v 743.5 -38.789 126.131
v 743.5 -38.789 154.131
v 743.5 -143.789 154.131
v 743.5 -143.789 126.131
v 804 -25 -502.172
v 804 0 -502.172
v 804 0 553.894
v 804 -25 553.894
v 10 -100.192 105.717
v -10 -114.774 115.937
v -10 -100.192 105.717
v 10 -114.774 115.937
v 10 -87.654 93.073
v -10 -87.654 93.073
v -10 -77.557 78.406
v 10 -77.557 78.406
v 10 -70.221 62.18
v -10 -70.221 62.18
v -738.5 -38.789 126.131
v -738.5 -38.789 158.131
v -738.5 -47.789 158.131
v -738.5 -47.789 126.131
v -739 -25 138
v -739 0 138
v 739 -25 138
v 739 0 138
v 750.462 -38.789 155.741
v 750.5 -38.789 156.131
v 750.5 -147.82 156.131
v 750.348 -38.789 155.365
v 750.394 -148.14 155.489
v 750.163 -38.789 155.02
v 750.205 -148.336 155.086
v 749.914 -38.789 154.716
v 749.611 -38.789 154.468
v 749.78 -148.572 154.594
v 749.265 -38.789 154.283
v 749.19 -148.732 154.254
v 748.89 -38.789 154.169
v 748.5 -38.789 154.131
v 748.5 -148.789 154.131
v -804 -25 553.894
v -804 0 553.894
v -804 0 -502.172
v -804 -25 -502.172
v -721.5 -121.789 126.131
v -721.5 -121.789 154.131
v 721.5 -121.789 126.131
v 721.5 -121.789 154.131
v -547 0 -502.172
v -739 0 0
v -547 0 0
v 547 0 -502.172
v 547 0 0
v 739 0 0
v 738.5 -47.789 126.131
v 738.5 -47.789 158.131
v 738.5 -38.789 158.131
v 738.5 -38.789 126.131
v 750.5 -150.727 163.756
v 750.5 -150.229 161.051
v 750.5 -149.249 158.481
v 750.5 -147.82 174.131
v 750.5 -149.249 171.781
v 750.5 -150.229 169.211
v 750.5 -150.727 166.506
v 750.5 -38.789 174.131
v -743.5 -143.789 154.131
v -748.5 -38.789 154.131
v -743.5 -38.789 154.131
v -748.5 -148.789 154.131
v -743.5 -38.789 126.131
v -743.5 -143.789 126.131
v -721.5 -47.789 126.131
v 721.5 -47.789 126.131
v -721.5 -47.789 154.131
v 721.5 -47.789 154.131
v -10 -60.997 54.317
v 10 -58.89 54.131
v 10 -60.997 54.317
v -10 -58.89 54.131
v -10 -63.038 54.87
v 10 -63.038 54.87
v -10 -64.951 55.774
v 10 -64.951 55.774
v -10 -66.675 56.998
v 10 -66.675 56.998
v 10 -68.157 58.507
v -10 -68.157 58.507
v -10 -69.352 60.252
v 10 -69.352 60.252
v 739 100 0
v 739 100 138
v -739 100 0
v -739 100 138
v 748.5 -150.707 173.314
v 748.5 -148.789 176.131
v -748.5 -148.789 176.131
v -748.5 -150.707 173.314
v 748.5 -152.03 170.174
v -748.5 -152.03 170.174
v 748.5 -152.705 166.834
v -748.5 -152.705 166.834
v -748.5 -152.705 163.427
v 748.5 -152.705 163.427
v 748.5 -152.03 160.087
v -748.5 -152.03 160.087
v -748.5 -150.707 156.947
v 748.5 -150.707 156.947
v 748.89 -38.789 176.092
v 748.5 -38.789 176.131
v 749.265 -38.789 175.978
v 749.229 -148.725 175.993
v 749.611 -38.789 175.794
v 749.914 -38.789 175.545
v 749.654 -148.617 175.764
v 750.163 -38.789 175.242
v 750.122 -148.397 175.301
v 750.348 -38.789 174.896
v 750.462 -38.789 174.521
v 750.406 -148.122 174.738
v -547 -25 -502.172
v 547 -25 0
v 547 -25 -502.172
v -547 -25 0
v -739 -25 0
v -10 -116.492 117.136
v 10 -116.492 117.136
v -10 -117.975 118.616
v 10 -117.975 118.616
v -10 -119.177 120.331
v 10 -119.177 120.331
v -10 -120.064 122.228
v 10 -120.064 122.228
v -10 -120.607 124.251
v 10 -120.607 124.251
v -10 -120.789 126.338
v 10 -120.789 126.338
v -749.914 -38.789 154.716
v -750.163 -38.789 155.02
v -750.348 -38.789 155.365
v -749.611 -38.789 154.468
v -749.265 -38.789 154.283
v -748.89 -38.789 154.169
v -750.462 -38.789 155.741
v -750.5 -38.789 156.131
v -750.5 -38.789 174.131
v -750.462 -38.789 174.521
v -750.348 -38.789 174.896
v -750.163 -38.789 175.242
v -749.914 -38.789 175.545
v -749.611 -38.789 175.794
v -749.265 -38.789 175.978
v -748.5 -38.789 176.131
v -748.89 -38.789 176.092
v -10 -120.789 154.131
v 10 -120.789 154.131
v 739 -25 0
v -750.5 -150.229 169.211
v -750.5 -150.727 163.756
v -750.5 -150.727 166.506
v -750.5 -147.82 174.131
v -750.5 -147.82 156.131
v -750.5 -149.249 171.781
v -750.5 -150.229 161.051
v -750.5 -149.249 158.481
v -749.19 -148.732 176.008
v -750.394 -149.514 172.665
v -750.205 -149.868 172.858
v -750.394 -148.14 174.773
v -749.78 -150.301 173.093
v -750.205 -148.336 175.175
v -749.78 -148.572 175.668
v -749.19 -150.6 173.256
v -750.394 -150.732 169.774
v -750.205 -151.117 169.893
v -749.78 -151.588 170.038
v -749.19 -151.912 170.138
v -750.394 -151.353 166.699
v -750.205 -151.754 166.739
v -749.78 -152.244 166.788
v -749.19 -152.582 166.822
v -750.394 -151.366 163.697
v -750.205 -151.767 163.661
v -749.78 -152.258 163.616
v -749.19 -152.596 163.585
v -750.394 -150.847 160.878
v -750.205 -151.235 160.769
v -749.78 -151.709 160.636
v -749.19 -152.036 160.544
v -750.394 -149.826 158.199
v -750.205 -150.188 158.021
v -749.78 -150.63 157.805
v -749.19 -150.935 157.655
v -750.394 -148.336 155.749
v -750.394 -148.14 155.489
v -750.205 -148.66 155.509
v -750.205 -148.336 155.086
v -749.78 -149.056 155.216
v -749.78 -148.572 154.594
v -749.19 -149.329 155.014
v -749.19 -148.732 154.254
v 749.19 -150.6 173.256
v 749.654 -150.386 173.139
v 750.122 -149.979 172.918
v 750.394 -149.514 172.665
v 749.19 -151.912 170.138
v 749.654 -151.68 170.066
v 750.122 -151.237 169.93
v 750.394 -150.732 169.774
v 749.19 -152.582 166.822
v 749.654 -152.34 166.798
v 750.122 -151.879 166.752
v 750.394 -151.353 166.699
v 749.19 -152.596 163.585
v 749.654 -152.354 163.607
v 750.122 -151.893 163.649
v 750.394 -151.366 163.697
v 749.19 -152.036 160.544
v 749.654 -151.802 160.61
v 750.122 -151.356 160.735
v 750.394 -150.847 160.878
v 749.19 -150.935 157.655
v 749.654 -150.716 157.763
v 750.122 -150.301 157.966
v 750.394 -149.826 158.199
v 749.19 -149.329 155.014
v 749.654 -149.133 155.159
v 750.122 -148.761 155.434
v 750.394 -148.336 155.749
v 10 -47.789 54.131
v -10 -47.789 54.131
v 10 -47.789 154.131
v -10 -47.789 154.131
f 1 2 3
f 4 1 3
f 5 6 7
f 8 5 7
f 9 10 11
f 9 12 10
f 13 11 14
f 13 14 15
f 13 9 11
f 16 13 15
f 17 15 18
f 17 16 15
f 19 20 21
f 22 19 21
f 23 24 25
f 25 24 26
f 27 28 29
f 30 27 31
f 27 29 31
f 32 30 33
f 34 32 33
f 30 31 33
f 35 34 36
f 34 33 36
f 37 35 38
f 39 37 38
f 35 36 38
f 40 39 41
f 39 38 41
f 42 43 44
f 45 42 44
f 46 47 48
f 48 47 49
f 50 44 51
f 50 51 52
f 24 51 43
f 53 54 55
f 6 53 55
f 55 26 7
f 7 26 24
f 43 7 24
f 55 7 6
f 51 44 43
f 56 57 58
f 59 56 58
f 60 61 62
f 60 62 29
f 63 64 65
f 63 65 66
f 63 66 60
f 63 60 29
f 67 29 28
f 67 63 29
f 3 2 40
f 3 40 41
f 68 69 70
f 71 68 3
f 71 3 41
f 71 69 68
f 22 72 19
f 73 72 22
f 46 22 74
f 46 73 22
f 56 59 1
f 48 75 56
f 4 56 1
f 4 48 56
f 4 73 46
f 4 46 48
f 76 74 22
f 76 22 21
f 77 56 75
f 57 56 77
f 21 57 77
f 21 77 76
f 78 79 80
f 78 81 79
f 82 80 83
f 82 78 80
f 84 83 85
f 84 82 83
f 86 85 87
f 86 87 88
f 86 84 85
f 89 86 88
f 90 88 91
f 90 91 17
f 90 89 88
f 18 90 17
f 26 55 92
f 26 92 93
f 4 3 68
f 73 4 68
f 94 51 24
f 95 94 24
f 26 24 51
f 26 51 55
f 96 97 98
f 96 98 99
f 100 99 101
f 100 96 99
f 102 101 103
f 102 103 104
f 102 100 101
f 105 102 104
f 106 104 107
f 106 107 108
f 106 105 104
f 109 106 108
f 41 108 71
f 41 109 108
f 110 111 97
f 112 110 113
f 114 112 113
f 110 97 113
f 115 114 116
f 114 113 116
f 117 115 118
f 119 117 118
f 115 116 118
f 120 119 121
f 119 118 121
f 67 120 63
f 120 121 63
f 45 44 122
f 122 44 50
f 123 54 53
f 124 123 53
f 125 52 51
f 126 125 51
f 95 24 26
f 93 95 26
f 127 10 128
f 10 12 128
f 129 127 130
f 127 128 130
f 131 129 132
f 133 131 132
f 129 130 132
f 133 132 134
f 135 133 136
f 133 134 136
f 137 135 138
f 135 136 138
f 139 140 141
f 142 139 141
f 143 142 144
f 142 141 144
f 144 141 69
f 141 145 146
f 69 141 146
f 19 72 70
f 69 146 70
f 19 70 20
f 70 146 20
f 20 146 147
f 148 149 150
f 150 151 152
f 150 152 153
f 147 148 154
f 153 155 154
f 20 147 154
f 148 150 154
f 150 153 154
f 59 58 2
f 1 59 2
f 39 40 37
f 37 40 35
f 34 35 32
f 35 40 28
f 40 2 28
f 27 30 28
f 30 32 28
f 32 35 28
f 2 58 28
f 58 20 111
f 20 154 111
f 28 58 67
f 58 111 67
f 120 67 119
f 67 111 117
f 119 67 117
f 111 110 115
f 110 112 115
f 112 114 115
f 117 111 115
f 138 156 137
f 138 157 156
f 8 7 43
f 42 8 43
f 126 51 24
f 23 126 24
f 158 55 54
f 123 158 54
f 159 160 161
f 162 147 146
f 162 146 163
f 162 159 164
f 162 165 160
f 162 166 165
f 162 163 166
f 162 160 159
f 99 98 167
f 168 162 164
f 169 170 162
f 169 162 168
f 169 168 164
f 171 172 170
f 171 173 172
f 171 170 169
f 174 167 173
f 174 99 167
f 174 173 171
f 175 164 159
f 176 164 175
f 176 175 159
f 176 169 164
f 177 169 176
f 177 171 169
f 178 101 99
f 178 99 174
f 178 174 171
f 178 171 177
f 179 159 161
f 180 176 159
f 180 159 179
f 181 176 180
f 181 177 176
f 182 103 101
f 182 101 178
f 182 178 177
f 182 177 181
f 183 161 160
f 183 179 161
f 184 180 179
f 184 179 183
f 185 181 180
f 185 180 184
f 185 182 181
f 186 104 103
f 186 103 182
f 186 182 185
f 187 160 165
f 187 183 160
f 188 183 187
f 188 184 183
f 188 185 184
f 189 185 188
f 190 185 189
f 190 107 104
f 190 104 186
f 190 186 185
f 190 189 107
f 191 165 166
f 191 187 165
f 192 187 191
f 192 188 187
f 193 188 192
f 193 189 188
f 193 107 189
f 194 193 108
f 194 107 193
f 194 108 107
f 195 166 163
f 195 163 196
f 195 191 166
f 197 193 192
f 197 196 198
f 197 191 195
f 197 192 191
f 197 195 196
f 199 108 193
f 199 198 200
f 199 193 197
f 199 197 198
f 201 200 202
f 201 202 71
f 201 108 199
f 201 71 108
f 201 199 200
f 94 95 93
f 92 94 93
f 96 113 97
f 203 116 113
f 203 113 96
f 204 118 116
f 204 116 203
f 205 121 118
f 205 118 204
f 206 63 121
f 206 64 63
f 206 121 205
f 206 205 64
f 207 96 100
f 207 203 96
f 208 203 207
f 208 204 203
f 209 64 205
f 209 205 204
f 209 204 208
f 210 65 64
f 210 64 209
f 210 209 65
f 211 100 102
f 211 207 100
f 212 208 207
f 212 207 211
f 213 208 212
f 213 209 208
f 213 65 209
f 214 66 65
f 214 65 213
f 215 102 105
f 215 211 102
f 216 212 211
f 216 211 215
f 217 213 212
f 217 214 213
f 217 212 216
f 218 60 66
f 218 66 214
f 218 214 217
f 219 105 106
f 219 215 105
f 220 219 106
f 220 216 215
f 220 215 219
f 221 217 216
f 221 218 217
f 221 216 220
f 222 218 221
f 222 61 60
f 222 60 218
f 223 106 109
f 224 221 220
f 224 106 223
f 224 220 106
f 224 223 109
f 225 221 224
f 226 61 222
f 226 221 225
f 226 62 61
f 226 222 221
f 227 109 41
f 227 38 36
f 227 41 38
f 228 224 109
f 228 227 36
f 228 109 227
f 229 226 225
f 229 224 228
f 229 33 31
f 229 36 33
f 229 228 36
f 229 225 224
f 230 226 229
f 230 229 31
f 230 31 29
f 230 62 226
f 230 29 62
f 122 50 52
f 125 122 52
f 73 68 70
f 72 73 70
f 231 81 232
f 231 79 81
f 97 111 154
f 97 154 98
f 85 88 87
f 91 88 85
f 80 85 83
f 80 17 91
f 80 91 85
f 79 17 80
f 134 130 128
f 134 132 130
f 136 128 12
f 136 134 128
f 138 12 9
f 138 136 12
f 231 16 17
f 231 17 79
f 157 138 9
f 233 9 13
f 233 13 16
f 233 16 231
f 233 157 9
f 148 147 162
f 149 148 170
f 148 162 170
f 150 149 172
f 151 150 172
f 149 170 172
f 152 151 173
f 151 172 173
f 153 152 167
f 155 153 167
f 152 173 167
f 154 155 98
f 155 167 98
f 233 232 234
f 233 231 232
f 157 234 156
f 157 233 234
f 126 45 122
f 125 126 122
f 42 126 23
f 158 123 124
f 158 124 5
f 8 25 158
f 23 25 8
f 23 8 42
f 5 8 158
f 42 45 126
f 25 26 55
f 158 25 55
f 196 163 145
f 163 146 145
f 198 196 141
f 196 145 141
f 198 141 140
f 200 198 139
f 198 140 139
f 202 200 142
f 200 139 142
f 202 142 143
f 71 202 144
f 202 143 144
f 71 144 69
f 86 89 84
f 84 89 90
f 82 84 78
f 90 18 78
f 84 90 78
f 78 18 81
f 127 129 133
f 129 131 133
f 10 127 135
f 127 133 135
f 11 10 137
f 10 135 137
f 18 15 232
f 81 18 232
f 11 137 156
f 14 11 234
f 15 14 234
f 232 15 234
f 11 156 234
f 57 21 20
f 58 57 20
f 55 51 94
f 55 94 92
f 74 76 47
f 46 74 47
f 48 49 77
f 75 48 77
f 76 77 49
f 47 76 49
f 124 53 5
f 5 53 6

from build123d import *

# Parameters (mm, degrees)
F0_W      = 1478
F0_H      = 138
F1_DEPTH  = 100
F3_DEPTH  = 750.5
F4_W      = 9
F4_H      = 4
F5_DEPTH  = 12
F6_W      = 9
F6_H      = 4
F7_DEPTH  = 12
F8_R      = 2
F11_DEPTH = 28
F13_DEPTH = 10
F15_DEPTH = 25
F16_W     = 17
F16_H     = 28
F17_DEPTH = 9
F18_R     = 12


with BuildPart() as f1:
    # F0 (on Front) → F1 (new body)
    with BuildSketch(Plane.XZ):
        with Locations((0, 69)):
            Rectangle(F0_W, F0_H)
    extrude(amount=-F1_DEPTH)


with BuildPart() as f3:
    # F2 (on Right) → F3 (new body, symmetric)
    with BuildSketch(Plane.YZ):
        with BuildLine():
            Line((-38.789494, 158.130697), (-38.789494, 176.130697))
            Line((-38.789494, 176.130697), (-148.789494, 176.130697))
            ThreePointArc((-148.789494, 176.130697), (-152.789494, 165.130697), (-148.789494, 154.130697))
            Line((-148.789494, 154.130697), (-47.789494, 154.130697))
            Line((-47.789494, 154.130697), (-47.789494, 158.130697))
            Line((-47.789494, 158.130697), (-38.789494, 158.130697))
        make_face()
    extrude(amount=F3_DEPTH, both=True)

    # F4 (on face) → F5 (join)
    with BuildSketch(Plane.YZ.offset(750.5)):
        with Locations((-43.289494, 156.130697)):
            Rectangle(F4_W, F4_H)
    extrude(amount=-F5_DEPTH)

    # F6 (on face) → F7 (join)
    with BuildSketch(Plane(origin=(-750.5, 0, 0), x_dir=(0, -1, 0), z_dir=(-1, 0, 0))):
        with Locations((43.289494, 156.130697)):
            Rectangle(F6_W, F6_H)
    extrude(amount=-F7_DEPTH)

    # F8
    f8_edges = [f3.edges().sort_by_distance(p)[0] for p in [
        (750.5, -93.789494, 154.130697),
        (750.5, -152.789494, 165.130697),
        (750.5, -93.789494, 176.130697),
        (-750.5, -152.789494, 165.130697),
        (-750.5, -93.789494, 154.130697),
        (-750.5, -93.789494, 176.130697),
    ]]
    fillet(f8_edges, radius=F8_R)

    # F10 (on face) → F11 (join)
    with BuildSketch(Plane(origin=(0, 0, 154.130697), x_dir=(1, 0, 0), z_dir=(0, 0, -1))):
        Polygon((721.5, 38.789494), (743.5, 38.789494), (743.5, 143.789494), (-743.5, 143.789494), (-743.5, 38.789494), (-721.5, 38.789494), (-721.5, 121.789494), (721.5, 121.789494), align=None)
    extrude(amount=F11_DEPTH)

    # F16 (on face) → F17 (cut, through all)
    with BuildSketch(Plane(origin=(0, -38.789494, 0), x_dir=(-1, 0, 0), z_dir=(0, 1, 0))):
        with Locations((-730, 140.130697)):
            Rectangle(F16_W, F16_H)
        with Locations((730, 140.130697)):
            Rectangle(F16_W, F16_H)
    extrude(amount=-F17_DEPTH, mode=Mode.SUBTRACT)


with BuildPart() as f13:
    # F12 (on Right) → F13 (new body, symmetric)
    with BuildSketch(Plane.YZ):
        with BuildLine():
            Line((-47.789494, 154.130697), (-120.789494, 154.130697))
            Line((-120.789494, 154.130697), (-120.789494, 119.130697))
            ThreePointArc((-120.789494, 119.130697), (-87.14592, 92.455457), (-67.789494, 54.130697))
            Line((-67.789494, 54.130697), (-47.789494, 54.130697))
            Line((-47.789494, 54.130697), (-47.789494, 154.130697))
        make_face()
    extrude(amount=F13_DEPTH, both=True)

    # F18
    f18_edges = [f13.edges().sort_by_distance(p)[0] for p in [
        (0, -120.789494, 119.130697),
        (0, -67.789494, 54.130697),
    ]]
    fillet(f18_edges, radius=F18_R)


with BuildPart() as f15:
    # F14 (on Front) → F15 (new body)
    with BuildSketch(Plane.XZ):
        Polygon((-547, -502.17247), (-547, 0), (-739, 0), (-739, 138), (739, 138), (739, 0), (547, 0), (547, -502.17247), (804, -502.17247), (804, 553.893745), (-804, 553.893745), (-804, -502.17247), align=None)
    extrude(amount=F15_DEPTH)


solid = Compound([f1.part, f3.part, f13.part, f15.part])
